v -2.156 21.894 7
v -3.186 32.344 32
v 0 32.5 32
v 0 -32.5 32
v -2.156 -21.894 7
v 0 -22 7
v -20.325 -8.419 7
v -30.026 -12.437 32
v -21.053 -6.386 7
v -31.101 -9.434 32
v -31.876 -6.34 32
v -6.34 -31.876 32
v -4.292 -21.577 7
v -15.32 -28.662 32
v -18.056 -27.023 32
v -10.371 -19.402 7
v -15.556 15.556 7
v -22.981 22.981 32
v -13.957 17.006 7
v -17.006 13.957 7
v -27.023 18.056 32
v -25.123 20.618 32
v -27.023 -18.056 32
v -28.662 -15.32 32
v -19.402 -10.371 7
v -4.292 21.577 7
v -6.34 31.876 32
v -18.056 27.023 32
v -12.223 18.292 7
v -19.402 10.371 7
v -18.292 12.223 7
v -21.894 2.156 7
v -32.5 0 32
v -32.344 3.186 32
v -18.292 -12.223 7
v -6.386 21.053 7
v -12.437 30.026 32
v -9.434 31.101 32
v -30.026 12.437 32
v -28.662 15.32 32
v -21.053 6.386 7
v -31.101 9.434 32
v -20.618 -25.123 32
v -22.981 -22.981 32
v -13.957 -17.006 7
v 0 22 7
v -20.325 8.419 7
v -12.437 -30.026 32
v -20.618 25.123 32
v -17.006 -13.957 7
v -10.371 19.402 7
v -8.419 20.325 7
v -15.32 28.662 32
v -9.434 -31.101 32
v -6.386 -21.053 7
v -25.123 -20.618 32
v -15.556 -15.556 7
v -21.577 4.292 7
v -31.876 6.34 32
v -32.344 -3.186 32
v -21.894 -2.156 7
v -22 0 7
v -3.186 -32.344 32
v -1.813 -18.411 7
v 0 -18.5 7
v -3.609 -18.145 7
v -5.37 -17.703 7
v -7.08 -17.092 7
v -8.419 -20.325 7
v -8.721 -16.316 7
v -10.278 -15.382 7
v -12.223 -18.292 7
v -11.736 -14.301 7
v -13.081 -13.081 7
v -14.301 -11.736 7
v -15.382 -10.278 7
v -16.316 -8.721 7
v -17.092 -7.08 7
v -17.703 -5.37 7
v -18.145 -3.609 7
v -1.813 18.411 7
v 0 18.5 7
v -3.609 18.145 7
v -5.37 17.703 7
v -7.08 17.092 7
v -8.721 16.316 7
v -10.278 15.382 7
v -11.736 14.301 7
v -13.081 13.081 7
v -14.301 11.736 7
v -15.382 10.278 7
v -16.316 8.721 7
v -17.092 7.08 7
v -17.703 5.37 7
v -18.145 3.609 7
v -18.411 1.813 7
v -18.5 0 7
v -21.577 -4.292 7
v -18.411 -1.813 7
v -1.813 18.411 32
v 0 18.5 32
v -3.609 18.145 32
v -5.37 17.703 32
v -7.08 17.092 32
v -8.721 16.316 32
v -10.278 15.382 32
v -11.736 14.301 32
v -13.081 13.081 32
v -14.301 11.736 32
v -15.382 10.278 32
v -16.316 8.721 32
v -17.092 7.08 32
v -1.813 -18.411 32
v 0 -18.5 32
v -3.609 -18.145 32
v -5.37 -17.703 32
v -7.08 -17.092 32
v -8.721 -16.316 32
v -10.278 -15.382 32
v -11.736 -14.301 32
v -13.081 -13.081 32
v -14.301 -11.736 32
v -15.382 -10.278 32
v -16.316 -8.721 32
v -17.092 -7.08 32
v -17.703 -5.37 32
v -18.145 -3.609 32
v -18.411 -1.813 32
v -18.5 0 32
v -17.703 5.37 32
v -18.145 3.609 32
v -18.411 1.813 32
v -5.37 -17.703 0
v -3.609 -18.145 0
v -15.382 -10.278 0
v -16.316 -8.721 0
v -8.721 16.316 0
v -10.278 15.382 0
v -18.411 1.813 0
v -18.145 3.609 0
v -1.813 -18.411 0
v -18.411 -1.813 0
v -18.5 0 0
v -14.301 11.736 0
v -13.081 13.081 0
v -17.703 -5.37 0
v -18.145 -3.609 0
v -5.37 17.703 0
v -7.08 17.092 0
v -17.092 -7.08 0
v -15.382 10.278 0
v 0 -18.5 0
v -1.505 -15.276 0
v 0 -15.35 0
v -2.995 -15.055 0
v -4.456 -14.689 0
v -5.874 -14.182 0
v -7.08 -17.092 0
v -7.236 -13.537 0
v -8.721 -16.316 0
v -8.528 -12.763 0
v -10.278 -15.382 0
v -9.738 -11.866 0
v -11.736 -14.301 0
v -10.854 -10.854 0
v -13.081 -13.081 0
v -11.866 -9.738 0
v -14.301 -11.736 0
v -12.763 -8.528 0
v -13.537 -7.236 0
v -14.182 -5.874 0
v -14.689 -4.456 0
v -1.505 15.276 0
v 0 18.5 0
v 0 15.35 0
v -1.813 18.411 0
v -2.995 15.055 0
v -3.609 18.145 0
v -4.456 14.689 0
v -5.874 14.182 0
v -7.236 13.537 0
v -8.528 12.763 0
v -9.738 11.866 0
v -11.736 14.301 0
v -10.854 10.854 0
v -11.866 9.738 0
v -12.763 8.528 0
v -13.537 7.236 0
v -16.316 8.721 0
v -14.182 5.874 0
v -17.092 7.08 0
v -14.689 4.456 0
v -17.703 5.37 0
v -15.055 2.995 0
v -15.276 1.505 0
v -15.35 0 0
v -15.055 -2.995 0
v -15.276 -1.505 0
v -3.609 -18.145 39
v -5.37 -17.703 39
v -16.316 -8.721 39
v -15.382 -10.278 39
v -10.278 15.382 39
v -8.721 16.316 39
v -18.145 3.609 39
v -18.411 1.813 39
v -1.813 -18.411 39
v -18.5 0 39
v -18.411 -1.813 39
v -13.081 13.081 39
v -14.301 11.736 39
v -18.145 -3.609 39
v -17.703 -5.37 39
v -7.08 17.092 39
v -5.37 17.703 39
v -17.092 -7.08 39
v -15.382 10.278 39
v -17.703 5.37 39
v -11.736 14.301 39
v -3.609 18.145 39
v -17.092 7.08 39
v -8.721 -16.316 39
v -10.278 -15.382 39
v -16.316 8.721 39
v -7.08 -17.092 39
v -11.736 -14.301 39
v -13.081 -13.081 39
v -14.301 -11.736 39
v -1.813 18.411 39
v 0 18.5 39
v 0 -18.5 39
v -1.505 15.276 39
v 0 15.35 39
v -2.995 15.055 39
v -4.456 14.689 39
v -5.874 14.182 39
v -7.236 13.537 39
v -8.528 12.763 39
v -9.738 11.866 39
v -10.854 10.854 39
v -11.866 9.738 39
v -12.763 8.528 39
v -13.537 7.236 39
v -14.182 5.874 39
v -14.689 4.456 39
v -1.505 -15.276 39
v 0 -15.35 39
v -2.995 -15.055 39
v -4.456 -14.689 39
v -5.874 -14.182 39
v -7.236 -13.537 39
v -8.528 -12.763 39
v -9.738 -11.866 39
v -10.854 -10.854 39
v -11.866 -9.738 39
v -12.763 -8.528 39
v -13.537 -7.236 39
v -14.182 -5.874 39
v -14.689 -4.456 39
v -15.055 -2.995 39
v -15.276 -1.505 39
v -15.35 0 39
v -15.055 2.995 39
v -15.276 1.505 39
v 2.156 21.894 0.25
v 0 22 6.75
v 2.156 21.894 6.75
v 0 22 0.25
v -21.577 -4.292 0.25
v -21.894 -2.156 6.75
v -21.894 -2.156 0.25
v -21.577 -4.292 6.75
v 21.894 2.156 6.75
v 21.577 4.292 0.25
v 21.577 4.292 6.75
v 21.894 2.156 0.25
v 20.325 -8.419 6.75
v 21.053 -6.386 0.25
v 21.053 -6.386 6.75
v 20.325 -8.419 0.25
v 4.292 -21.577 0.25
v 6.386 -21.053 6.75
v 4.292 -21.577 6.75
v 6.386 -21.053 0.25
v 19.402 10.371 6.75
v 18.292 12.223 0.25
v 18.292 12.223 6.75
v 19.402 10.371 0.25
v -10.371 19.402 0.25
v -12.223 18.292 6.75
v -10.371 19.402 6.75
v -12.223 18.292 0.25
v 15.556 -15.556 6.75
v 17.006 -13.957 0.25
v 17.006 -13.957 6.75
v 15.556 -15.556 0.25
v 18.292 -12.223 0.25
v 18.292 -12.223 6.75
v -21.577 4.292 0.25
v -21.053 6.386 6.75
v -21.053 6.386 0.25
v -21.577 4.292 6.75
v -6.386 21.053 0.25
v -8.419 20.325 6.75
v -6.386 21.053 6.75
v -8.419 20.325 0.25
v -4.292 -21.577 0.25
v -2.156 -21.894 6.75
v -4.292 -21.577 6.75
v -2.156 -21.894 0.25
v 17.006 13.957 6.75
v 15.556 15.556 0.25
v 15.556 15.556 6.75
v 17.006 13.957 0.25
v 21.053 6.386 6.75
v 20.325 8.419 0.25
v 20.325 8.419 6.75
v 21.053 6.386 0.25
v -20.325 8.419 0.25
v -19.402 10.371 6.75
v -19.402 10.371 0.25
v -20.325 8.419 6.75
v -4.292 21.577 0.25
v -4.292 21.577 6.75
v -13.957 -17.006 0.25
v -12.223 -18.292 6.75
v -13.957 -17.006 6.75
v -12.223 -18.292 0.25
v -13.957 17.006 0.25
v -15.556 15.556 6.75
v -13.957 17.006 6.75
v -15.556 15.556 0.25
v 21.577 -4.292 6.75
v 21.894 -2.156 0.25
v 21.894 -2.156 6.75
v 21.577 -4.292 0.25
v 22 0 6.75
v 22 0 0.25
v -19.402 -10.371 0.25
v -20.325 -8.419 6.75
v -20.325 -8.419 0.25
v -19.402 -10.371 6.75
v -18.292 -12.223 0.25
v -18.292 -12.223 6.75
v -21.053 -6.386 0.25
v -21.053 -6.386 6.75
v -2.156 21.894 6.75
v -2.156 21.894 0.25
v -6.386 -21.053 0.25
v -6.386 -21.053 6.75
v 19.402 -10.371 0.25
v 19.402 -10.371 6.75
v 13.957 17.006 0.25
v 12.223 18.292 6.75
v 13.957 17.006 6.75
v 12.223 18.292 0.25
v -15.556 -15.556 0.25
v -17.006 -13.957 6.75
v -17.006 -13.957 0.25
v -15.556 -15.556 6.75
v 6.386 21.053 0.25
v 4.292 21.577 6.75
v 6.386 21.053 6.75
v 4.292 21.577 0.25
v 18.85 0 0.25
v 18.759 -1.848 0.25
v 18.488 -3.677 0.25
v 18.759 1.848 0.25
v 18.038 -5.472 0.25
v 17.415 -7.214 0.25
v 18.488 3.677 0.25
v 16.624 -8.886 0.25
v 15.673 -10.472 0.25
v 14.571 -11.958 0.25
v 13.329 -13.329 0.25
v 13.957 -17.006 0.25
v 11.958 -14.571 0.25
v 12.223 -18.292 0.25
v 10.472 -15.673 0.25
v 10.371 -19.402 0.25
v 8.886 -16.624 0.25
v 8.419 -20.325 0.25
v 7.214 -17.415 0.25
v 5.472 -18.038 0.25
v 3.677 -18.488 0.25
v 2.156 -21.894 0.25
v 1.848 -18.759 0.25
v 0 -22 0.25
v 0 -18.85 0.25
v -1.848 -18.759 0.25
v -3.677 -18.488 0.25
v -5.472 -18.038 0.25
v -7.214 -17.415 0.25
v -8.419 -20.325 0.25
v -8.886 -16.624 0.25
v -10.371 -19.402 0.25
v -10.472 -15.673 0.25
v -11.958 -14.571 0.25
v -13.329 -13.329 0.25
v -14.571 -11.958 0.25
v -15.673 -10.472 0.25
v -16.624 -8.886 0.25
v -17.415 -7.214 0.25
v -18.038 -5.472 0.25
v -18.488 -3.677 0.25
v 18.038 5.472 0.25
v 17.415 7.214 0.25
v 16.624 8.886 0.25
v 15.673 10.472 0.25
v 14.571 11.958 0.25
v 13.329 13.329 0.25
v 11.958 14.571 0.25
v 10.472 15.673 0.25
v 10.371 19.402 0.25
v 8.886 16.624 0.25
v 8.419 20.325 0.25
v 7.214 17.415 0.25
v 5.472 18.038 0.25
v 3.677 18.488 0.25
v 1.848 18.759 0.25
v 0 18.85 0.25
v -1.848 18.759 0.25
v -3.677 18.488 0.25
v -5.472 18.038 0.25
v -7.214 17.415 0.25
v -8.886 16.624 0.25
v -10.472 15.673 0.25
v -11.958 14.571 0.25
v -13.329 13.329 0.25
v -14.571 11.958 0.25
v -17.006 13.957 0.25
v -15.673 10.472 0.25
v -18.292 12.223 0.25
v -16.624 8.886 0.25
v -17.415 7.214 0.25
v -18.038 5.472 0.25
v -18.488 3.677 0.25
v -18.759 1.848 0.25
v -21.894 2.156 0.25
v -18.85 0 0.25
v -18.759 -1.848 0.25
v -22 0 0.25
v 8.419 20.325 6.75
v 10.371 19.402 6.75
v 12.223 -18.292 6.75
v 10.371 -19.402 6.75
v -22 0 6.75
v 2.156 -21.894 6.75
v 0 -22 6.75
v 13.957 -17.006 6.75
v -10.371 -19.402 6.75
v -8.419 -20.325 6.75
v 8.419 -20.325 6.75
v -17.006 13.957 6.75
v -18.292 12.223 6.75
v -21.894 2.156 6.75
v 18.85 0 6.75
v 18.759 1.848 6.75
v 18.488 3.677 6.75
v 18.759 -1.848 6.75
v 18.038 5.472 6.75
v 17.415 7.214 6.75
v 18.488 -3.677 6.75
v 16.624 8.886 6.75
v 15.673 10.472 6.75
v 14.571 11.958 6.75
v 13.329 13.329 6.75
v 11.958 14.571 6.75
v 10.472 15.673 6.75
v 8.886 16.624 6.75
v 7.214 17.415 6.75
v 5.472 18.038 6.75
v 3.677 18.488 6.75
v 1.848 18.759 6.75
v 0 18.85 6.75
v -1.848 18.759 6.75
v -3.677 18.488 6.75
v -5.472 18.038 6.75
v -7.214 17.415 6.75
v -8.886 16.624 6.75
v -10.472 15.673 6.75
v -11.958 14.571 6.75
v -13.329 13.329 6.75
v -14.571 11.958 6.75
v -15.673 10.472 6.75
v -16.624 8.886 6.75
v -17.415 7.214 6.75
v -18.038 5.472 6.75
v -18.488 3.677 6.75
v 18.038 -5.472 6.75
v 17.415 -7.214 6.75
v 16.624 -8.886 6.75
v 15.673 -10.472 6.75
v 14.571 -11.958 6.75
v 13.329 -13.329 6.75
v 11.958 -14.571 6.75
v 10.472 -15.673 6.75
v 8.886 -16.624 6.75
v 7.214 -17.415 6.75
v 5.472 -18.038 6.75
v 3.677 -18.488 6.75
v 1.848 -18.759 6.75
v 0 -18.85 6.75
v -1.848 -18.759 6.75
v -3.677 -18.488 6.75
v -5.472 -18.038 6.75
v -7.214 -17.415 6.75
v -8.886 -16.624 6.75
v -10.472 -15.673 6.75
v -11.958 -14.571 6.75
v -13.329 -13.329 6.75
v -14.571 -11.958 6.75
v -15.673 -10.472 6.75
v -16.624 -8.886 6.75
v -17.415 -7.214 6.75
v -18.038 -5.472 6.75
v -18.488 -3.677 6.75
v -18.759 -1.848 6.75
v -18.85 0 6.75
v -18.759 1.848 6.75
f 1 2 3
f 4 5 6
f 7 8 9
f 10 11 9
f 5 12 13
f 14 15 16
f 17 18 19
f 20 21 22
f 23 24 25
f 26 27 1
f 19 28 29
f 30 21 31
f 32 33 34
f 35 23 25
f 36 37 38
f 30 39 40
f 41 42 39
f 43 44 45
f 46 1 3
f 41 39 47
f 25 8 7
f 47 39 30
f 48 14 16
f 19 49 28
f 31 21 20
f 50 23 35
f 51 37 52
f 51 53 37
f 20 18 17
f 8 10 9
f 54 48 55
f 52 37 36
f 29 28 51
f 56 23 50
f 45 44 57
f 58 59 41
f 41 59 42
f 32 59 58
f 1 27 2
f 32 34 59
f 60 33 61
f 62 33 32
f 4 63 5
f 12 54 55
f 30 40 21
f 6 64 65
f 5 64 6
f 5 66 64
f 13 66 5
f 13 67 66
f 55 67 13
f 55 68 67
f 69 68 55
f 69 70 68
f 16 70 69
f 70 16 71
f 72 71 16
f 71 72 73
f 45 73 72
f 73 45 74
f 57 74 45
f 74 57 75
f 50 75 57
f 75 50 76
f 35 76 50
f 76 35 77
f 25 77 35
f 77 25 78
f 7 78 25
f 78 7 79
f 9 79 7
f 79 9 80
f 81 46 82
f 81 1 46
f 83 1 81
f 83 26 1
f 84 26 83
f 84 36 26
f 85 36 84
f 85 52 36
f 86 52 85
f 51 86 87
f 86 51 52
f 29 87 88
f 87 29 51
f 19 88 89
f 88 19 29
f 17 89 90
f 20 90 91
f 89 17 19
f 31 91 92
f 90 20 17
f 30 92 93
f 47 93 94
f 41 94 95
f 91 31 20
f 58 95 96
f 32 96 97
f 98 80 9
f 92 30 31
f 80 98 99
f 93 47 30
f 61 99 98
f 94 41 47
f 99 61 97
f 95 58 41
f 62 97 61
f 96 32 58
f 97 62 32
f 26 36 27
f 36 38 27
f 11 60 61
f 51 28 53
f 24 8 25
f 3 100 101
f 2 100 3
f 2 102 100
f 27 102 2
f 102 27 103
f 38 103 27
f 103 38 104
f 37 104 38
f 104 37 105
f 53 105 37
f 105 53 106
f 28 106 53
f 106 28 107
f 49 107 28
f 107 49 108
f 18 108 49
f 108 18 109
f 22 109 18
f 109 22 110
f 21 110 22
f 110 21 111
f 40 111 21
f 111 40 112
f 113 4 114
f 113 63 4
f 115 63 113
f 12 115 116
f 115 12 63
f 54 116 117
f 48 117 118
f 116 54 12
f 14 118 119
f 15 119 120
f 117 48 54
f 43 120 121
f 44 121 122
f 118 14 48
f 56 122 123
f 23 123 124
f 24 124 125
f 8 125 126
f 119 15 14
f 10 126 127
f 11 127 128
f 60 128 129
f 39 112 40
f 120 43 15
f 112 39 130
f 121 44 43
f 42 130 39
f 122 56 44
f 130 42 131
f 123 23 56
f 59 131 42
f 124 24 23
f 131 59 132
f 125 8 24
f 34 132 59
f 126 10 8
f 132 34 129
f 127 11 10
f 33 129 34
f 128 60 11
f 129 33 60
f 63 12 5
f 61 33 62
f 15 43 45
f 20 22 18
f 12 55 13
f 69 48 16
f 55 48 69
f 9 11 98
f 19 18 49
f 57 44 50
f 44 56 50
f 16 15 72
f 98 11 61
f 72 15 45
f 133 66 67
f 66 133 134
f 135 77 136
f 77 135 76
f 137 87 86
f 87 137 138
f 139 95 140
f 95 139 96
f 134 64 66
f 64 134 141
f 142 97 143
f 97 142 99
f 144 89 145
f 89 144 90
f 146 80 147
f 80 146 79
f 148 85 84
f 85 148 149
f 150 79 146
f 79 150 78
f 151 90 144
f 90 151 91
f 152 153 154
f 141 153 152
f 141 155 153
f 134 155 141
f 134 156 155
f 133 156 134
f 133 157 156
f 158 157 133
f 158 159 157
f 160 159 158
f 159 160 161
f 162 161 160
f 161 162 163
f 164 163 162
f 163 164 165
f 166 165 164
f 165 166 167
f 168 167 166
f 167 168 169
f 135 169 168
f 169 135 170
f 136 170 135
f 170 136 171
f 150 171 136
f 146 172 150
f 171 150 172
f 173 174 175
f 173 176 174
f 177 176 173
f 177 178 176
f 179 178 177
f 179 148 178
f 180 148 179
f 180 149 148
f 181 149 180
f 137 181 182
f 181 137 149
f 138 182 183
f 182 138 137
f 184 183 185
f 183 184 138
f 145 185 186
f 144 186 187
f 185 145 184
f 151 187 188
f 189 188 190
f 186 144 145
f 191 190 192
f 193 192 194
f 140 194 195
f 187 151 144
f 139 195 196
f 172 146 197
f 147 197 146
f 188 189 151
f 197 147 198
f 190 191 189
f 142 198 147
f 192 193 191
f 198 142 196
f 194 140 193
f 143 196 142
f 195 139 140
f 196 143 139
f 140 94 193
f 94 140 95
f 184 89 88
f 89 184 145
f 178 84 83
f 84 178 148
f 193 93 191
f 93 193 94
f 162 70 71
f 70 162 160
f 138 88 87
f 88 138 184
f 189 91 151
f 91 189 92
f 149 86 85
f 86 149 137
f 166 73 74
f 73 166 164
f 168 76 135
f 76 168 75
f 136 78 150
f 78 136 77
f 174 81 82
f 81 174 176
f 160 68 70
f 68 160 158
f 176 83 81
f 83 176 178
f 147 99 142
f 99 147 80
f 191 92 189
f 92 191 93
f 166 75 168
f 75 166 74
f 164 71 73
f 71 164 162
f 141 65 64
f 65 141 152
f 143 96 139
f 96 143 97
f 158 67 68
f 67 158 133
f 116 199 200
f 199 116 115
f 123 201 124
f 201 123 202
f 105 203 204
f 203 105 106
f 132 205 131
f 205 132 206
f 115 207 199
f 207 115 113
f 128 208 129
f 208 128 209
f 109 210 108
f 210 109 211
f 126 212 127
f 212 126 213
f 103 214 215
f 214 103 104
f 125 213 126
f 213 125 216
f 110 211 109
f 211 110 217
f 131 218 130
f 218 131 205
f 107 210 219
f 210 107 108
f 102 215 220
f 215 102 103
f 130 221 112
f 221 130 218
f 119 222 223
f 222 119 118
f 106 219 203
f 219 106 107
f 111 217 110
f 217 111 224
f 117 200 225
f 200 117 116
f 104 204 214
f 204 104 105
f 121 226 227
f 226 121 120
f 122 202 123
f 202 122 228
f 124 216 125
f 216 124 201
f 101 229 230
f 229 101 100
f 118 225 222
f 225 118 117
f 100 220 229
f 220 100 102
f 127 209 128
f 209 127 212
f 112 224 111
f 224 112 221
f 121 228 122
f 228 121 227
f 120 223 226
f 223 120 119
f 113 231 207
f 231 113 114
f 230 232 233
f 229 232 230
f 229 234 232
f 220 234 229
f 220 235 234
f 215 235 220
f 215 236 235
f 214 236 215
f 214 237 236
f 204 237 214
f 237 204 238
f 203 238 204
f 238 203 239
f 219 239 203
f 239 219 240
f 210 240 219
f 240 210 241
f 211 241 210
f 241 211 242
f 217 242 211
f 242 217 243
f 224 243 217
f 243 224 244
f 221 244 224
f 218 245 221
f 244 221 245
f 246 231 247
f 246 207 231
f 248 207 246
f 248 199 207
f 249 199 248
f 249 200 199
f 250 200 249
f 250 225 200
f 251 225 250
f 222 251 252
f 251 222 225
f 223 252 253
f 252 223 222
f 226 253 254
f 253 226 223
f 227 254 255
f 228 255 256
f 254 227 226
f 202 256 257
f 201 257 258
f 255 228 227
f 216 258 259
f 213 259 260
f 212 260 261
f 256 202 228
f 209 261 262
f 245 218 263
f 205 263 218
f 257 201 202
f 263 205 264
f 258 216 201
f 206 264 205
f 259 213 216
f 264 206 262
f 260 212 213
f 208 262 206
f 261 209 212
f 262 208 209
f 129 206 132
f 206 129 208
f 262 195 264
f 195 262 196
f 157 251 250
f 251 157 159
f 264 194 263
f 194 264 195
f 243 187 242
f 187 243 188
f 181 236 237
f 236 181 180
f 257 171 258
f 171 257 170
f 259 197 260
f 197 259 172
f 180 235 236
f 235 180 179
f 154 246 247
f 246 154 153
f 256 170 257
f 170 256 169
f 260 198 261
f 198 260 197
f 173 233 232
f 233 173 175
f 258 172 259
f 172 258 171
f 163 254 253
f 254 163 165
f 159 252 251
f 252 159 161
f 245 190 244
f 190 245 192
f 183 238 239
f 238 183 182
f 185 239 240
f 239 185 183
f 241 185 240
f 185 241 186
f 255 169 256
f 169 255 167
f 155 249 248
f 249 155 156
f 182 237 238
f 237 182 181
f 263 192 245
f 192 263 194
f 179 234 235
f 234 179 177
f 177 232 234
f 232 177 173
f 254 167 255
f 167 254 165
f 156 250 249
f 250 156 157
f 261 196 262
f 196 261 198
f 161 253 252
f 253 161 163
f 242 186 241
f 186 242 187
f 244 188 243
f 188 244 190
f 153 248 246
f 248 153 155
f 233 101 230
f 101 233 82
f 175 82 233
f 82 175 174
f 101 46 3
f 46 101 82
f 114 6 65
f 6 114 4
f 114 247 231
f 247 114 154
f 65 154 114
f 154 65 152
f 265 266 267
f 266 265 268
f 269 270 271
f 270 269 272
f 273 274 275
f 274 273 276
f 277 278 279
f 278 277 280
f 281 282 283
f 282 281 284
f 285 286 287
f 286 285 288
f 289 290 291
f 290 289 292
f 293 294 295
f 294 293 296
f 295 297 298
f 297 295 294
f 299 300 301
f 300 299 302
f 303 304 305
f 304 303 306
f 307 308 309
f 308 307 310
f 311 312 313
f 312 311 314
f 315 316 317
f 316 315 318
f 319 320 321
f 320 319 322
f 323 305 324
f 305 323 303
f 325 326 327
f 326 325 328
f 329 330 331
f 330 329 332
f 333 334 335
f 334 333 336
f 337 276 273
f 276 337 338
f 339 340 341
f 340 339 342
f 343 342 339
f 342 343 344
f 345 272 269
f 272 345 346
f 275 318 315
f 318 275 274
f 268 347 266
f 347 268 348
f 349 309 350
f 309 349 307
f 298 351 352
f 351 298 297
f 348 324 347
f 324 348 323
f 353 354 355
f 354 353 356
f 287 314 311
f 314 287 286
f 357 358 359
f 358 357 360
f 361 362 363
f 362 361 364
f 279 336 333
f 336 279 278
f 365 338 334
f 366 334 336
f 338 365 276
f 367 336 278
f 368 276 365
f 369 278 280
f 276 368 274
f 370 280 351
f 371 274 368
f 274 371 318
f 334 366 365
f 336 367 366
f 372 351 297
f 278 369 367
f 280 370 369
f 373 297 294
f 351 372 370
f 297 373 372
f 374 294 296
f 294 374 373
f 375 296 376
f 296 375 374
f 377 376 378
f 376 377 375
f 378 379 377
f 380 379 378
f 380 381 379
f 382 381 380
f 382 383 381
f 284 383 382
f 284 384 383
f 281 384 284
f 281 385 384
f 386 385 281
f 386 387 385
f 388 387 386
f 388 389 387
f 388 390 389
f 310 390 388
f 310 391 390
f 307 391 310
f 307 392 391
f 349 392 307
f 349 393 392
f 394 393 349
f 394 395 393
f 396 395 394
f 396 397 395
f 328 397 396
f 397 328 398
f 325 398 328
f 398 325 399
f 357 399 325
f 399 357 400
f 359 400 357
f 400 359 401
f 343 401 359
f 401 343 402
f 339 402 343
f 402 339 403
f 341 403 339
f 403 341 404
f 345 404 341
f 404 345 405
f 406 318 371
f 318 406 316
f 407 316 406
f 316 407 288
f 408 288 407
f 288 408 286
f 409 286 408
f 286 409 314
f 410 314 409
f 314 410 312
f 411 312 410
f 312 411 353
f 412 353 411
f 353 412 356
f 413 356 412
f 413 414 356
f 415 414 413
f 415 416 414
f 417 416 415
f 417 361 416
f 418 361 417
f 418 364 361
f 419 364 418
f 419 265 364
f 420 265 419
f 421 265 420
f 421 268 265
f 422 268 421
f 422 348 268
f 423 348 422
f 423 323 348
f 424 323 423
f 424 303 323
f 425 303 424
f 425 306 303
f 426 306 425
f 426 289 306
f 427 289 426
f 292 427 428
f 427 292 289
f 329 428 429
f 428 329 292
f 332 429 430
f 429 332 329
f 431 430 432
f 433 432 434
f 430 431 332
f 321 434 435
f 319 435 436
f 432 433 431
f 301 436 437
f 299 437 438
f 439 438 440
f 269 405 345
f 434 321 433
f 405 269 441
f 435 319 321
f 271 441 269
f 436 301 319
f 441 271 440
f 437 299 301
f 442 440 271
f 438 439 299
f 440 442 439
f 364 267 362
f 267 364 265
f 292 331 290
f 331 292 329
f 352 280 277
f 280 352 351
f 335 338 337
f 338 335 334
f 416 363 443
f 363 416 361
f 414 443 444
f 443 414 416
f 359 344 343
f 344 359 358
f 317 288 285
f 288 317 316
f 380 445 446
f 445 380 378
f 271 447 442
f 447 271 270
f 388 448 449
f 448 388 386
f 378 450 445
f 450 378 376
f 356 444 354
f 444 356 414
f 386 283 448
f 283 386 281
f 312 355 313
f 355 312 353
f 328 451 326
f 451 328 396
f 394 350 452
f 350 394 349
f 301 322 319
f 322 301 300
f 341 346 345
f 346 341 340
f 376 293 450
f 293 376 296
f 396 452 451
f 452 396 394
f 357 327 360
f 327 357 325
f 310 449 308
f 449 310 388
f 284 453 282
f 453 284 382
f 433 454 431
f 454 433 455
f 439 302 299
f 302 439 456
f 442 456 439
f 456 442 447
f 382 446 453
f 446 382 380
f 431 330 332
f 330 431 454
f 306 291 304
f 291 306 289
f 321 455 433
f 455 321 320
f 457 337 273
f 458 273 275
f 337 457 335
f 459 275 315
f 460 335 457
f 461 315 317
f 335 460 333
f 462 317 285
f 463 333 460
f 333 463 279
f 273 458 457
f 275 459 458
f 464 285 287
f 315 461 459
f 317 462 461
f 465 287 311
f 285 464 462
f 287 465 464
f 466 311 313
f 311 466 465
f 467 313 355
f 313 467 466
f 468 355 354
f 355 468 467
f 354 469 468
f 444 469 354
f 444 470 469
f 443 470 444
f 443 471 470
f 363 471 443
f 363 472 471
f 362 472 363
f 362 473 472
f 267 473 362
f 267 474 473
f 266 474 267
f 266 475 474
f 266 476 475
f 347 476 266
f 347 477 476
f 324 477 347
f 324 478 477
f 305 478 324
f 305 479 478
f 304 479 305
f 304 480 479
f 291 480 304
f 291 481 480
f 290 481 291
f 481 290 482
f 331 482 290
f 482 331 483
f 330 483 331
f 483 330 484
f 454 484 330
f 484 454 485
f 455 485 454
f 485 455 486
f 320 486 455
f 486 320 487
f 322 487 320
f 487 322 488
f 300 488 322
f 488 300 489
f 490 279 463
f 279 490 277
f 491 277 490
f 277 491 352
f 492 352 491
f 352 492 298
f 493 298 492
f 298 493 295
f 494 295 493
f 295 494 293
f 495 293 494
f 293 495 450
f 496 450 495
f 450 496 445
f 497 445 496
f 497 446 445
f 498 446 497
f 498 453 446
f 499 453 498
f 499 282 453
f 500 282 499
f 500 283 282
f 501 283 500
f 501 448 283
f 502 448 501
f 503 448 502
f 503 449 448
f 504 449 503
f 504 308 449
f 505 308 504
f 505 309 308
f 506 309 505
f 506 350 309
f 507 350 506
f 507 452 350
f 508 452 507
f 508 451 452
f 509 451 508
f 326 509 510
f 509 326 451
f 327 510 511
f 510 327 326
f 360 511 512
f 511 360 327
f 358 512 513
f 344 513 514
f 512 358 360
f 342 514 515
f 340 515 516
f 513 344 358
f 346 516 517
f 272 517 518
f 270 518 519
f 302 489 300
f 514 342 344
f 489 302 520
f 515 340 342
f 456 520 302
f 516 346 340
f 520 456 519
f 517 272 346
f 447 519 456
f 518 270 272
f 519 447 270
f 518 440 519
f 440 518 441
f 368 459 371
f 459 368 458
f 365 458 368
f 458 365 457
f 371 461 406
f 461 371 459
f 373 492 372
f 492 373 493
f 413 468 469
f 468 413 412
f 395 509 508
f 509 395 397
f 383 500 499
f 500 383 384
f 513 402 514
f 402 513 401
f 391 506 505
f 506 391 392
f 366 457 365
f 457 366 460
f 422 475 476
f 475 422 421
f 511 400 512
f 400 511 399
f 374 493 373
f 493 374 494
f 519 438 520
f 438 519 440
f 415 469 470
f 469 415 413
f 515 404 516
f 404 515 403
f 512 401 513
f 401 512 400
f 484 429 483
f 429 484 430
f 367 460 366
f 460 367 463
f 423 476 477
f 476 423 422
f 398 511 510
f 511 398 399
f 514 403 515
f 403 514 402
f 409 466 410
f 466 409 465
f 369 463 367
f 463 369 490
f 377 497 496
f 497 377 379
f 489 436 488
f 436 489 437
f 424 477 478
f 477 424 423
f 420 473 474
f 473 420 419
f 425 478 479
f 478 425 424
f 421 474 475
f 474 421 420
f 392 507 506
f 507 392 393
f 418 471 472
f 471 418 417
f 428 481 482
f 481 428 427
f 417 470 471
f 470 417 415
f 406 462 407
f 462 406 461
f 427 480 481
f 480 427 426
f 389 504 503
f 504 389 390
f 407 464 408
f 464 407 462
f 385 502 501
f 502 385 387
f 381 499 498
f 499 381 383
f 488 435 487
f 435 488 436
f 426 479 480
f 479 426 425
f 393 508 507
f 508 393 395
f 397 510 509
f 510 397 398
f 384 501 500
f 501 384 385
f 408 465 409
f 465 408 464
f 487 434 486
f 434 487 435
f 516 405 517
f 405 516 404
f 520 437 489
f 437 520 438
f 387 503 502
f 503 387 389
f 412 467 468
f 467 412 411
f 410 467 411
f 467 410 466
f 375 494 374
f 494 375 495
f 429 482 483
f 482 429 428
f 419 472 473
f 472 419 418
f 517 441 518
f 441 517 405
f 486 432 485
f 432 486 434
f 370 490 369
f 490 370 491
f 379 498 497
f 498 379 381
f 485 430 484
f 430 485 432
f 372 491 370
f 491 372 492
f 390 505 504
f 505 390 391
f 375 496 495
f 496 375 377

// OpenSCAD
// 30mm holder diam
// 37mm rod_lip
// 65mm max spool size

clearance=.7;

$fn = 64;

module test_ring() {
  difference() {
    cylinder(h=5, d=50);

  translate([0,0,-.5])
    cylinder(h=6, d=37);
  }
}

module rod() {
    translate([0,0,-.5])
      cylinder(d=30+clearance, h=50);
}

module cone() {
translate([0,0,7])
  cylinder(h=25, d1=44, d2=65);

cylinder(h=7, d=37);
    
translate([0,0,32])
    cylinder(h=7, d=37);
}

module half() {
    translate([0,-32.5,-.5])
    cube([65,65,66]);
}

module spool_half() {
    difference() {
      cone();
      rod();
      half();
  }
}

module lock_ring() {
  difference() {
    translate([0,0,.25])
      cylinder(d=44, h=6.5);
  // minus...
    translate([0,0,0])
      cylinder(h=7, d=37+clearance);
  }
}

spool_half();
lock_ring();
